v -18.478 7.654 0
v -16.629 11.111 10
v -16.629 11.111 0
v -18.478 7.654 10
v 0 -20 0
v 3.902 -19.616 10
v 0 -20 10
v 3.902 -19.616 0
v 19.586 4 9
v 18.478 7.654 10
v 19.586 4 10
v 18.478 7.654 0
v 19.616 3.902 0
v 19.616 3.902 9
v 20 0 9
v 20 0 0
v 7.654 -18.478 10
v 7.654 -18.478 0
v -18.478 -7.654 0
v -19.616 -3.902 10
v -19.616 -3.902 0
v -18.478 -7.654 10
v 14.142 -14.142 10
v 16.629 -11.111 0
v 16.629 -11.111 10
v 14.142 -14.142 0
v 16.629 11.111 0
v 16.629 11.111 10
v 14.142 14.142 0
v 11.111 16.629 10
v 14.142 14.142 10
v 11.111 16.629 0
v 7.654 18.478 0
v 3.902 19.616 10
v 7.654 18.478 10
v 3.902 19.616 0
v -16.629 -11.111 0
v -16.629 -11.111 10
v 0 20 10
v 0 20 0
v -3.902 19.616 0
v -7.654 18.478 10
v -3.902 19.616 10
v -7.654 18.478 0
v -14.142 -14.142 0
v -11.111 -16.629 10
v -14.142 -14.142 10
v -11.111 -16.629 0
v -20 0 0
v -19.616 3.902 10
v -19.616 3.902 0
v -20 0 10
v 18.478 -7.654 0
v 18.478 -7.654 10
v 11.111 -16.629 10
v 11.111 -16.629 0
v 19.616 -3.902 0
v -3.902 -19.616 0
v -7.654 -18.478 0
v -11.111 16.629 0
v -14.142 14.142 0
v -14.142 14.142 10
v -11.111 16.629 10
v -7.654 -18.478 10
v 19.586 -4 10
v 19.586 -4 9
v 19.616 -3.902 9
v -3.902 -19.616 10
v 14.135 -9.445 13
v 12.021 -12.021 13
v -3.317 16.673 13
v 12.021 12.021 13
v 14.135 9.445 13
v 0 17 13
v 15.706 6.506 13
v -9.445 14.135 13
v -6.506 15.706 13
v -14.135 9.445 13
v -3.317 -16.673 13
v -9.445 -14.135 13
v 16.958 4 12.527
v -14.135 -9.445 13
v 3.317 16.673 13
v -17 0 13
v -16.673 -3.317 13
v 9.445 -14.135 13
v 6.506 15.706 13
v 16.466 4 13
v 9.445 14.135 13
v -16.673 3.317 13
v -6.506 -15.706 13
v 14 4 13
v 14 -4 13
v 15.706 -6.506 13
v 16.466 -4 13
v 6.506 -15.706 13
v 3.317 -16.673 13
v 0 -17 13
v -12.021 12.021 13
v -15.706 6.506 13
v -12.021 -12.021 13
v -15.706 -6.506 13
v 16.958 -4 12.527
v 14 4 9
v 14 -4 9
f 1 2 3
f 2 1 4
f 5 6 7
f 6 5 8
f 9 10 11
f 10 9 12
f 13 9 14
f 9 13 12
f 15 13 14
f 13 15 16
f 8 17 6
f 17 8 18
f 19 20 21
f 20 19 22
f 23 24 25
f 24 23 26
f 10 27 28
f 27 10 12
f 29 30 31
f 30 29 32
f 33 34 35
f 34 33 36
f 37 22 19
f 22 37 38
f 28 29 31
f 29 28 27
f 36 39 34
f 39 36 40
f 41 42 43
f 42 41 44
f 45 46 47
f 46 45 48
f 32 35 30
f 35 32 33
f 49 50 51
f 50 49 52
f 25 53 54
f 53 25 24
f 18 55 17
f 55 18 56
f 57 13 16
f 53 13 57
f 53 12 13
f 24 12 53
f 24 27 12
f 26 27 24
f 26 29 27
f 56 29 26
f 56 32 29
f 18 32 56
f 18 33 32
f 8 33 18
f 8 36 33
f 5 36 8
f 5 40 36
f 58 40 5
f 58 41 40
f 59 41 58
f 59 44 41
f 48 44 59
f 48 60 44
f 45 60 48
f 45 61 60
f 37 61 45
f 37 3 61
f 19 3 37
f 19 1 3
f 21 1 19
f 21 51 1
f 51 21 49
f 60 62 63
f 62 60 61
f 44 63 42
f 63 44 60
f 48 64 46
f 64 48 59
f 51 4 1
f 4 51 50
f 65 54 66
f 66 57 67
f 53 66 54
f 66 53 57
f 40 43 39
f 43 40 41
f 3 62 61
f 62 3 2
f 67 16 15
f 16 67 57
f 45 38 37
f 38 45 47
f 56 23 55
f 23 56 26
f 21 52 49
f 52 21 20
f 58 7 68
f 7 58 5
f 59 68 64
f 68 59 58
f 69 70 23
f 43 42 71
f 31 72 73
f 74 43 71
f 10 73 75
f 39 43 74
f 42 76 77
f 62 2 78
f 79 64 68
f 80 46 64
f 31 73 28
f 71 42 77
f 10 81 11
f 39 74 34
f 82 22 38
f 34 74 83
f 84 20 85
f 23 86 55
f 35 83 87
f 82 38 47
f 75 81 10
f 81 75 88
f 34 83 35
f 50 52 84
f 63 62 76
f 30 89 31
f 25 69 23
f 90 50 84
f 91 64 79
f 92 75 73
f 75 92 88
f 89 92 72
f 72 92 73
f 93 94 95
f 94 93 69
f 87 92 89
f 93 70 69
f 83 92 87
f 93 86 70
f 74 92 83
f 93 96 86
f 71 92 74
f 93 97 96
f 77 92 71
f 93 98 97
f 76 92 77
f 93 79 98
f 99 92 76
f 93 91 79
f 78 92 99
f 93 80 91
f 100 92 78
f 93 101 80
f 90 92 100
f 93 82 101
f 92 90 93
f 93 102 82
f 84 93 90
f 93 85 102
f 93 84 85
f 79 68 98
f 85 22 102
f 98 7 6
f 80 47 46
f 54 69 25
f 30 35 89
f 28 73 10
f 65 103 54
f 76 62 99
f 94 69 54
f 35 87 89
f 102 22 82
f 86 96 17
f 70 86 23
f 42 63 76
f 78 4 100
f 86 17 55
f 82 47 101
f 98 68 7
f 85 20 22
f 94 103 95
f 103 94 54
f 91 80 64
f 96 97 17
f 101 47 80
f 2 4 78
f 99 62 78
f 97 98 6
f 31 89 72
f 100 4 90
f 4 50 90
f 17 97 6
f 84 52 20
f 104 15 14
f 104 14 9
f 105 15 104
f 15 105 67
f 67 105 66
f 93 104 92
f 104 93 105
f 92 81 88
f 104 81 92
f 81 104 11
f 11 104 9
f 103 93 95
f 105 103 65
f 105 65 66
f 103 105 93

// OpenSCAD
// One declared surface must be written as one kind of face.
//
// This is the smallest model that reproduces the defect open item 25's work
// found on lid10 and the bayonet: a single declared surface of a single
// original solid, written partly as a band's wall and partly as a quadric
// patch, with the division decided by nothing but the order the recognition
// passes run in. The export says so:
//
//   1 declared surface is split between different kinds of recogniser, over 32
//   facets - a cylinder, surface 0, 32 facets (28 to a band's wall, 4 to a
//   quadric face) - 2 mesh edges have a differently-held facet on each side, so
//   this is one connected region cut in two by pass order - a band's wall from
//   original 1; a quadric face from original 1
//
// which is the same signature as lid10's cone 50 (56 to a band, 6 to a quadric,
// 2 edges across the divide, one original) at half the size and in ten lines.
//
// Why this shape. The chamfer makes the cylinder's wall end at something other
// than a clean rim, and the notch removes part of that ending over a few facets
// only. A band is a ring between two rims and has no shape for what is left, so
// it claims the ring and the remainder falls to whichever pass runs next. Any
// boolean that leaves a declared surface as "a ring plus a few facets" does
// this; the notch is simply the shortest way to write one.
//
// What this fixture does NOT assert is a volume. The boolean cuts the
// *tessellation* while the surface is written *analytically*, so the solid is a
// trim following 32-gon edges bounding an exact cylindrical face, and the two
// do not compose into closed-form arithmetic - measured, a segment formula
// leaves 4.88 mm3 unexplained on a simpler variant of this. That is also why
// lid10 carries no derived volume. The assertion this model is for is
// representation-independence: writing the surface one way or the other must
// not change the solid. See doc/step-recognition-design.md.
//
// Every facet its maker named for a declared surface is D0 by that heritage,
// whole or cut, and has to end in a face written on that surface (checklist
// B6, B7, E8). A facet a boolean cut is not in its surface's D0 region yet -
// the region holds whole facets only - so nothing proposes it at the exact
// tier, and at the approximation tier a statistic over the tessellation
// refuses it (C3). Measured 2026-09-29:
//   approximation tier, 2 facets (2 cut): 2 on cone 5 (a quadric face: fewer than three facets of
//     the surface were free to claim)
//   exact tier, 4 facets (4 cut): 2 on cone 5 (claimed by nothing for it); 2 on cylinder 0
//     (claimed by nothing for it)
// Tolerated by name until cut facets join their region and no statistic
// vetoes a named facet (doc/step-export-wip.md, open item 34); the test
// fails the day it is no longer raised.
// KNOWN-EXPORT-ERROR: facets named by their maker for a declared surface are not written on it
$fn = 32;
difference() {
  union() {
    cylinder(h = 10, r = 20);
    translate([0, 0, 10]) cylinder(h = 3, r1 = 20, r2 = 17);
  }
  translate([14, -4, 9]) cube([12, 8, 6]);
}
